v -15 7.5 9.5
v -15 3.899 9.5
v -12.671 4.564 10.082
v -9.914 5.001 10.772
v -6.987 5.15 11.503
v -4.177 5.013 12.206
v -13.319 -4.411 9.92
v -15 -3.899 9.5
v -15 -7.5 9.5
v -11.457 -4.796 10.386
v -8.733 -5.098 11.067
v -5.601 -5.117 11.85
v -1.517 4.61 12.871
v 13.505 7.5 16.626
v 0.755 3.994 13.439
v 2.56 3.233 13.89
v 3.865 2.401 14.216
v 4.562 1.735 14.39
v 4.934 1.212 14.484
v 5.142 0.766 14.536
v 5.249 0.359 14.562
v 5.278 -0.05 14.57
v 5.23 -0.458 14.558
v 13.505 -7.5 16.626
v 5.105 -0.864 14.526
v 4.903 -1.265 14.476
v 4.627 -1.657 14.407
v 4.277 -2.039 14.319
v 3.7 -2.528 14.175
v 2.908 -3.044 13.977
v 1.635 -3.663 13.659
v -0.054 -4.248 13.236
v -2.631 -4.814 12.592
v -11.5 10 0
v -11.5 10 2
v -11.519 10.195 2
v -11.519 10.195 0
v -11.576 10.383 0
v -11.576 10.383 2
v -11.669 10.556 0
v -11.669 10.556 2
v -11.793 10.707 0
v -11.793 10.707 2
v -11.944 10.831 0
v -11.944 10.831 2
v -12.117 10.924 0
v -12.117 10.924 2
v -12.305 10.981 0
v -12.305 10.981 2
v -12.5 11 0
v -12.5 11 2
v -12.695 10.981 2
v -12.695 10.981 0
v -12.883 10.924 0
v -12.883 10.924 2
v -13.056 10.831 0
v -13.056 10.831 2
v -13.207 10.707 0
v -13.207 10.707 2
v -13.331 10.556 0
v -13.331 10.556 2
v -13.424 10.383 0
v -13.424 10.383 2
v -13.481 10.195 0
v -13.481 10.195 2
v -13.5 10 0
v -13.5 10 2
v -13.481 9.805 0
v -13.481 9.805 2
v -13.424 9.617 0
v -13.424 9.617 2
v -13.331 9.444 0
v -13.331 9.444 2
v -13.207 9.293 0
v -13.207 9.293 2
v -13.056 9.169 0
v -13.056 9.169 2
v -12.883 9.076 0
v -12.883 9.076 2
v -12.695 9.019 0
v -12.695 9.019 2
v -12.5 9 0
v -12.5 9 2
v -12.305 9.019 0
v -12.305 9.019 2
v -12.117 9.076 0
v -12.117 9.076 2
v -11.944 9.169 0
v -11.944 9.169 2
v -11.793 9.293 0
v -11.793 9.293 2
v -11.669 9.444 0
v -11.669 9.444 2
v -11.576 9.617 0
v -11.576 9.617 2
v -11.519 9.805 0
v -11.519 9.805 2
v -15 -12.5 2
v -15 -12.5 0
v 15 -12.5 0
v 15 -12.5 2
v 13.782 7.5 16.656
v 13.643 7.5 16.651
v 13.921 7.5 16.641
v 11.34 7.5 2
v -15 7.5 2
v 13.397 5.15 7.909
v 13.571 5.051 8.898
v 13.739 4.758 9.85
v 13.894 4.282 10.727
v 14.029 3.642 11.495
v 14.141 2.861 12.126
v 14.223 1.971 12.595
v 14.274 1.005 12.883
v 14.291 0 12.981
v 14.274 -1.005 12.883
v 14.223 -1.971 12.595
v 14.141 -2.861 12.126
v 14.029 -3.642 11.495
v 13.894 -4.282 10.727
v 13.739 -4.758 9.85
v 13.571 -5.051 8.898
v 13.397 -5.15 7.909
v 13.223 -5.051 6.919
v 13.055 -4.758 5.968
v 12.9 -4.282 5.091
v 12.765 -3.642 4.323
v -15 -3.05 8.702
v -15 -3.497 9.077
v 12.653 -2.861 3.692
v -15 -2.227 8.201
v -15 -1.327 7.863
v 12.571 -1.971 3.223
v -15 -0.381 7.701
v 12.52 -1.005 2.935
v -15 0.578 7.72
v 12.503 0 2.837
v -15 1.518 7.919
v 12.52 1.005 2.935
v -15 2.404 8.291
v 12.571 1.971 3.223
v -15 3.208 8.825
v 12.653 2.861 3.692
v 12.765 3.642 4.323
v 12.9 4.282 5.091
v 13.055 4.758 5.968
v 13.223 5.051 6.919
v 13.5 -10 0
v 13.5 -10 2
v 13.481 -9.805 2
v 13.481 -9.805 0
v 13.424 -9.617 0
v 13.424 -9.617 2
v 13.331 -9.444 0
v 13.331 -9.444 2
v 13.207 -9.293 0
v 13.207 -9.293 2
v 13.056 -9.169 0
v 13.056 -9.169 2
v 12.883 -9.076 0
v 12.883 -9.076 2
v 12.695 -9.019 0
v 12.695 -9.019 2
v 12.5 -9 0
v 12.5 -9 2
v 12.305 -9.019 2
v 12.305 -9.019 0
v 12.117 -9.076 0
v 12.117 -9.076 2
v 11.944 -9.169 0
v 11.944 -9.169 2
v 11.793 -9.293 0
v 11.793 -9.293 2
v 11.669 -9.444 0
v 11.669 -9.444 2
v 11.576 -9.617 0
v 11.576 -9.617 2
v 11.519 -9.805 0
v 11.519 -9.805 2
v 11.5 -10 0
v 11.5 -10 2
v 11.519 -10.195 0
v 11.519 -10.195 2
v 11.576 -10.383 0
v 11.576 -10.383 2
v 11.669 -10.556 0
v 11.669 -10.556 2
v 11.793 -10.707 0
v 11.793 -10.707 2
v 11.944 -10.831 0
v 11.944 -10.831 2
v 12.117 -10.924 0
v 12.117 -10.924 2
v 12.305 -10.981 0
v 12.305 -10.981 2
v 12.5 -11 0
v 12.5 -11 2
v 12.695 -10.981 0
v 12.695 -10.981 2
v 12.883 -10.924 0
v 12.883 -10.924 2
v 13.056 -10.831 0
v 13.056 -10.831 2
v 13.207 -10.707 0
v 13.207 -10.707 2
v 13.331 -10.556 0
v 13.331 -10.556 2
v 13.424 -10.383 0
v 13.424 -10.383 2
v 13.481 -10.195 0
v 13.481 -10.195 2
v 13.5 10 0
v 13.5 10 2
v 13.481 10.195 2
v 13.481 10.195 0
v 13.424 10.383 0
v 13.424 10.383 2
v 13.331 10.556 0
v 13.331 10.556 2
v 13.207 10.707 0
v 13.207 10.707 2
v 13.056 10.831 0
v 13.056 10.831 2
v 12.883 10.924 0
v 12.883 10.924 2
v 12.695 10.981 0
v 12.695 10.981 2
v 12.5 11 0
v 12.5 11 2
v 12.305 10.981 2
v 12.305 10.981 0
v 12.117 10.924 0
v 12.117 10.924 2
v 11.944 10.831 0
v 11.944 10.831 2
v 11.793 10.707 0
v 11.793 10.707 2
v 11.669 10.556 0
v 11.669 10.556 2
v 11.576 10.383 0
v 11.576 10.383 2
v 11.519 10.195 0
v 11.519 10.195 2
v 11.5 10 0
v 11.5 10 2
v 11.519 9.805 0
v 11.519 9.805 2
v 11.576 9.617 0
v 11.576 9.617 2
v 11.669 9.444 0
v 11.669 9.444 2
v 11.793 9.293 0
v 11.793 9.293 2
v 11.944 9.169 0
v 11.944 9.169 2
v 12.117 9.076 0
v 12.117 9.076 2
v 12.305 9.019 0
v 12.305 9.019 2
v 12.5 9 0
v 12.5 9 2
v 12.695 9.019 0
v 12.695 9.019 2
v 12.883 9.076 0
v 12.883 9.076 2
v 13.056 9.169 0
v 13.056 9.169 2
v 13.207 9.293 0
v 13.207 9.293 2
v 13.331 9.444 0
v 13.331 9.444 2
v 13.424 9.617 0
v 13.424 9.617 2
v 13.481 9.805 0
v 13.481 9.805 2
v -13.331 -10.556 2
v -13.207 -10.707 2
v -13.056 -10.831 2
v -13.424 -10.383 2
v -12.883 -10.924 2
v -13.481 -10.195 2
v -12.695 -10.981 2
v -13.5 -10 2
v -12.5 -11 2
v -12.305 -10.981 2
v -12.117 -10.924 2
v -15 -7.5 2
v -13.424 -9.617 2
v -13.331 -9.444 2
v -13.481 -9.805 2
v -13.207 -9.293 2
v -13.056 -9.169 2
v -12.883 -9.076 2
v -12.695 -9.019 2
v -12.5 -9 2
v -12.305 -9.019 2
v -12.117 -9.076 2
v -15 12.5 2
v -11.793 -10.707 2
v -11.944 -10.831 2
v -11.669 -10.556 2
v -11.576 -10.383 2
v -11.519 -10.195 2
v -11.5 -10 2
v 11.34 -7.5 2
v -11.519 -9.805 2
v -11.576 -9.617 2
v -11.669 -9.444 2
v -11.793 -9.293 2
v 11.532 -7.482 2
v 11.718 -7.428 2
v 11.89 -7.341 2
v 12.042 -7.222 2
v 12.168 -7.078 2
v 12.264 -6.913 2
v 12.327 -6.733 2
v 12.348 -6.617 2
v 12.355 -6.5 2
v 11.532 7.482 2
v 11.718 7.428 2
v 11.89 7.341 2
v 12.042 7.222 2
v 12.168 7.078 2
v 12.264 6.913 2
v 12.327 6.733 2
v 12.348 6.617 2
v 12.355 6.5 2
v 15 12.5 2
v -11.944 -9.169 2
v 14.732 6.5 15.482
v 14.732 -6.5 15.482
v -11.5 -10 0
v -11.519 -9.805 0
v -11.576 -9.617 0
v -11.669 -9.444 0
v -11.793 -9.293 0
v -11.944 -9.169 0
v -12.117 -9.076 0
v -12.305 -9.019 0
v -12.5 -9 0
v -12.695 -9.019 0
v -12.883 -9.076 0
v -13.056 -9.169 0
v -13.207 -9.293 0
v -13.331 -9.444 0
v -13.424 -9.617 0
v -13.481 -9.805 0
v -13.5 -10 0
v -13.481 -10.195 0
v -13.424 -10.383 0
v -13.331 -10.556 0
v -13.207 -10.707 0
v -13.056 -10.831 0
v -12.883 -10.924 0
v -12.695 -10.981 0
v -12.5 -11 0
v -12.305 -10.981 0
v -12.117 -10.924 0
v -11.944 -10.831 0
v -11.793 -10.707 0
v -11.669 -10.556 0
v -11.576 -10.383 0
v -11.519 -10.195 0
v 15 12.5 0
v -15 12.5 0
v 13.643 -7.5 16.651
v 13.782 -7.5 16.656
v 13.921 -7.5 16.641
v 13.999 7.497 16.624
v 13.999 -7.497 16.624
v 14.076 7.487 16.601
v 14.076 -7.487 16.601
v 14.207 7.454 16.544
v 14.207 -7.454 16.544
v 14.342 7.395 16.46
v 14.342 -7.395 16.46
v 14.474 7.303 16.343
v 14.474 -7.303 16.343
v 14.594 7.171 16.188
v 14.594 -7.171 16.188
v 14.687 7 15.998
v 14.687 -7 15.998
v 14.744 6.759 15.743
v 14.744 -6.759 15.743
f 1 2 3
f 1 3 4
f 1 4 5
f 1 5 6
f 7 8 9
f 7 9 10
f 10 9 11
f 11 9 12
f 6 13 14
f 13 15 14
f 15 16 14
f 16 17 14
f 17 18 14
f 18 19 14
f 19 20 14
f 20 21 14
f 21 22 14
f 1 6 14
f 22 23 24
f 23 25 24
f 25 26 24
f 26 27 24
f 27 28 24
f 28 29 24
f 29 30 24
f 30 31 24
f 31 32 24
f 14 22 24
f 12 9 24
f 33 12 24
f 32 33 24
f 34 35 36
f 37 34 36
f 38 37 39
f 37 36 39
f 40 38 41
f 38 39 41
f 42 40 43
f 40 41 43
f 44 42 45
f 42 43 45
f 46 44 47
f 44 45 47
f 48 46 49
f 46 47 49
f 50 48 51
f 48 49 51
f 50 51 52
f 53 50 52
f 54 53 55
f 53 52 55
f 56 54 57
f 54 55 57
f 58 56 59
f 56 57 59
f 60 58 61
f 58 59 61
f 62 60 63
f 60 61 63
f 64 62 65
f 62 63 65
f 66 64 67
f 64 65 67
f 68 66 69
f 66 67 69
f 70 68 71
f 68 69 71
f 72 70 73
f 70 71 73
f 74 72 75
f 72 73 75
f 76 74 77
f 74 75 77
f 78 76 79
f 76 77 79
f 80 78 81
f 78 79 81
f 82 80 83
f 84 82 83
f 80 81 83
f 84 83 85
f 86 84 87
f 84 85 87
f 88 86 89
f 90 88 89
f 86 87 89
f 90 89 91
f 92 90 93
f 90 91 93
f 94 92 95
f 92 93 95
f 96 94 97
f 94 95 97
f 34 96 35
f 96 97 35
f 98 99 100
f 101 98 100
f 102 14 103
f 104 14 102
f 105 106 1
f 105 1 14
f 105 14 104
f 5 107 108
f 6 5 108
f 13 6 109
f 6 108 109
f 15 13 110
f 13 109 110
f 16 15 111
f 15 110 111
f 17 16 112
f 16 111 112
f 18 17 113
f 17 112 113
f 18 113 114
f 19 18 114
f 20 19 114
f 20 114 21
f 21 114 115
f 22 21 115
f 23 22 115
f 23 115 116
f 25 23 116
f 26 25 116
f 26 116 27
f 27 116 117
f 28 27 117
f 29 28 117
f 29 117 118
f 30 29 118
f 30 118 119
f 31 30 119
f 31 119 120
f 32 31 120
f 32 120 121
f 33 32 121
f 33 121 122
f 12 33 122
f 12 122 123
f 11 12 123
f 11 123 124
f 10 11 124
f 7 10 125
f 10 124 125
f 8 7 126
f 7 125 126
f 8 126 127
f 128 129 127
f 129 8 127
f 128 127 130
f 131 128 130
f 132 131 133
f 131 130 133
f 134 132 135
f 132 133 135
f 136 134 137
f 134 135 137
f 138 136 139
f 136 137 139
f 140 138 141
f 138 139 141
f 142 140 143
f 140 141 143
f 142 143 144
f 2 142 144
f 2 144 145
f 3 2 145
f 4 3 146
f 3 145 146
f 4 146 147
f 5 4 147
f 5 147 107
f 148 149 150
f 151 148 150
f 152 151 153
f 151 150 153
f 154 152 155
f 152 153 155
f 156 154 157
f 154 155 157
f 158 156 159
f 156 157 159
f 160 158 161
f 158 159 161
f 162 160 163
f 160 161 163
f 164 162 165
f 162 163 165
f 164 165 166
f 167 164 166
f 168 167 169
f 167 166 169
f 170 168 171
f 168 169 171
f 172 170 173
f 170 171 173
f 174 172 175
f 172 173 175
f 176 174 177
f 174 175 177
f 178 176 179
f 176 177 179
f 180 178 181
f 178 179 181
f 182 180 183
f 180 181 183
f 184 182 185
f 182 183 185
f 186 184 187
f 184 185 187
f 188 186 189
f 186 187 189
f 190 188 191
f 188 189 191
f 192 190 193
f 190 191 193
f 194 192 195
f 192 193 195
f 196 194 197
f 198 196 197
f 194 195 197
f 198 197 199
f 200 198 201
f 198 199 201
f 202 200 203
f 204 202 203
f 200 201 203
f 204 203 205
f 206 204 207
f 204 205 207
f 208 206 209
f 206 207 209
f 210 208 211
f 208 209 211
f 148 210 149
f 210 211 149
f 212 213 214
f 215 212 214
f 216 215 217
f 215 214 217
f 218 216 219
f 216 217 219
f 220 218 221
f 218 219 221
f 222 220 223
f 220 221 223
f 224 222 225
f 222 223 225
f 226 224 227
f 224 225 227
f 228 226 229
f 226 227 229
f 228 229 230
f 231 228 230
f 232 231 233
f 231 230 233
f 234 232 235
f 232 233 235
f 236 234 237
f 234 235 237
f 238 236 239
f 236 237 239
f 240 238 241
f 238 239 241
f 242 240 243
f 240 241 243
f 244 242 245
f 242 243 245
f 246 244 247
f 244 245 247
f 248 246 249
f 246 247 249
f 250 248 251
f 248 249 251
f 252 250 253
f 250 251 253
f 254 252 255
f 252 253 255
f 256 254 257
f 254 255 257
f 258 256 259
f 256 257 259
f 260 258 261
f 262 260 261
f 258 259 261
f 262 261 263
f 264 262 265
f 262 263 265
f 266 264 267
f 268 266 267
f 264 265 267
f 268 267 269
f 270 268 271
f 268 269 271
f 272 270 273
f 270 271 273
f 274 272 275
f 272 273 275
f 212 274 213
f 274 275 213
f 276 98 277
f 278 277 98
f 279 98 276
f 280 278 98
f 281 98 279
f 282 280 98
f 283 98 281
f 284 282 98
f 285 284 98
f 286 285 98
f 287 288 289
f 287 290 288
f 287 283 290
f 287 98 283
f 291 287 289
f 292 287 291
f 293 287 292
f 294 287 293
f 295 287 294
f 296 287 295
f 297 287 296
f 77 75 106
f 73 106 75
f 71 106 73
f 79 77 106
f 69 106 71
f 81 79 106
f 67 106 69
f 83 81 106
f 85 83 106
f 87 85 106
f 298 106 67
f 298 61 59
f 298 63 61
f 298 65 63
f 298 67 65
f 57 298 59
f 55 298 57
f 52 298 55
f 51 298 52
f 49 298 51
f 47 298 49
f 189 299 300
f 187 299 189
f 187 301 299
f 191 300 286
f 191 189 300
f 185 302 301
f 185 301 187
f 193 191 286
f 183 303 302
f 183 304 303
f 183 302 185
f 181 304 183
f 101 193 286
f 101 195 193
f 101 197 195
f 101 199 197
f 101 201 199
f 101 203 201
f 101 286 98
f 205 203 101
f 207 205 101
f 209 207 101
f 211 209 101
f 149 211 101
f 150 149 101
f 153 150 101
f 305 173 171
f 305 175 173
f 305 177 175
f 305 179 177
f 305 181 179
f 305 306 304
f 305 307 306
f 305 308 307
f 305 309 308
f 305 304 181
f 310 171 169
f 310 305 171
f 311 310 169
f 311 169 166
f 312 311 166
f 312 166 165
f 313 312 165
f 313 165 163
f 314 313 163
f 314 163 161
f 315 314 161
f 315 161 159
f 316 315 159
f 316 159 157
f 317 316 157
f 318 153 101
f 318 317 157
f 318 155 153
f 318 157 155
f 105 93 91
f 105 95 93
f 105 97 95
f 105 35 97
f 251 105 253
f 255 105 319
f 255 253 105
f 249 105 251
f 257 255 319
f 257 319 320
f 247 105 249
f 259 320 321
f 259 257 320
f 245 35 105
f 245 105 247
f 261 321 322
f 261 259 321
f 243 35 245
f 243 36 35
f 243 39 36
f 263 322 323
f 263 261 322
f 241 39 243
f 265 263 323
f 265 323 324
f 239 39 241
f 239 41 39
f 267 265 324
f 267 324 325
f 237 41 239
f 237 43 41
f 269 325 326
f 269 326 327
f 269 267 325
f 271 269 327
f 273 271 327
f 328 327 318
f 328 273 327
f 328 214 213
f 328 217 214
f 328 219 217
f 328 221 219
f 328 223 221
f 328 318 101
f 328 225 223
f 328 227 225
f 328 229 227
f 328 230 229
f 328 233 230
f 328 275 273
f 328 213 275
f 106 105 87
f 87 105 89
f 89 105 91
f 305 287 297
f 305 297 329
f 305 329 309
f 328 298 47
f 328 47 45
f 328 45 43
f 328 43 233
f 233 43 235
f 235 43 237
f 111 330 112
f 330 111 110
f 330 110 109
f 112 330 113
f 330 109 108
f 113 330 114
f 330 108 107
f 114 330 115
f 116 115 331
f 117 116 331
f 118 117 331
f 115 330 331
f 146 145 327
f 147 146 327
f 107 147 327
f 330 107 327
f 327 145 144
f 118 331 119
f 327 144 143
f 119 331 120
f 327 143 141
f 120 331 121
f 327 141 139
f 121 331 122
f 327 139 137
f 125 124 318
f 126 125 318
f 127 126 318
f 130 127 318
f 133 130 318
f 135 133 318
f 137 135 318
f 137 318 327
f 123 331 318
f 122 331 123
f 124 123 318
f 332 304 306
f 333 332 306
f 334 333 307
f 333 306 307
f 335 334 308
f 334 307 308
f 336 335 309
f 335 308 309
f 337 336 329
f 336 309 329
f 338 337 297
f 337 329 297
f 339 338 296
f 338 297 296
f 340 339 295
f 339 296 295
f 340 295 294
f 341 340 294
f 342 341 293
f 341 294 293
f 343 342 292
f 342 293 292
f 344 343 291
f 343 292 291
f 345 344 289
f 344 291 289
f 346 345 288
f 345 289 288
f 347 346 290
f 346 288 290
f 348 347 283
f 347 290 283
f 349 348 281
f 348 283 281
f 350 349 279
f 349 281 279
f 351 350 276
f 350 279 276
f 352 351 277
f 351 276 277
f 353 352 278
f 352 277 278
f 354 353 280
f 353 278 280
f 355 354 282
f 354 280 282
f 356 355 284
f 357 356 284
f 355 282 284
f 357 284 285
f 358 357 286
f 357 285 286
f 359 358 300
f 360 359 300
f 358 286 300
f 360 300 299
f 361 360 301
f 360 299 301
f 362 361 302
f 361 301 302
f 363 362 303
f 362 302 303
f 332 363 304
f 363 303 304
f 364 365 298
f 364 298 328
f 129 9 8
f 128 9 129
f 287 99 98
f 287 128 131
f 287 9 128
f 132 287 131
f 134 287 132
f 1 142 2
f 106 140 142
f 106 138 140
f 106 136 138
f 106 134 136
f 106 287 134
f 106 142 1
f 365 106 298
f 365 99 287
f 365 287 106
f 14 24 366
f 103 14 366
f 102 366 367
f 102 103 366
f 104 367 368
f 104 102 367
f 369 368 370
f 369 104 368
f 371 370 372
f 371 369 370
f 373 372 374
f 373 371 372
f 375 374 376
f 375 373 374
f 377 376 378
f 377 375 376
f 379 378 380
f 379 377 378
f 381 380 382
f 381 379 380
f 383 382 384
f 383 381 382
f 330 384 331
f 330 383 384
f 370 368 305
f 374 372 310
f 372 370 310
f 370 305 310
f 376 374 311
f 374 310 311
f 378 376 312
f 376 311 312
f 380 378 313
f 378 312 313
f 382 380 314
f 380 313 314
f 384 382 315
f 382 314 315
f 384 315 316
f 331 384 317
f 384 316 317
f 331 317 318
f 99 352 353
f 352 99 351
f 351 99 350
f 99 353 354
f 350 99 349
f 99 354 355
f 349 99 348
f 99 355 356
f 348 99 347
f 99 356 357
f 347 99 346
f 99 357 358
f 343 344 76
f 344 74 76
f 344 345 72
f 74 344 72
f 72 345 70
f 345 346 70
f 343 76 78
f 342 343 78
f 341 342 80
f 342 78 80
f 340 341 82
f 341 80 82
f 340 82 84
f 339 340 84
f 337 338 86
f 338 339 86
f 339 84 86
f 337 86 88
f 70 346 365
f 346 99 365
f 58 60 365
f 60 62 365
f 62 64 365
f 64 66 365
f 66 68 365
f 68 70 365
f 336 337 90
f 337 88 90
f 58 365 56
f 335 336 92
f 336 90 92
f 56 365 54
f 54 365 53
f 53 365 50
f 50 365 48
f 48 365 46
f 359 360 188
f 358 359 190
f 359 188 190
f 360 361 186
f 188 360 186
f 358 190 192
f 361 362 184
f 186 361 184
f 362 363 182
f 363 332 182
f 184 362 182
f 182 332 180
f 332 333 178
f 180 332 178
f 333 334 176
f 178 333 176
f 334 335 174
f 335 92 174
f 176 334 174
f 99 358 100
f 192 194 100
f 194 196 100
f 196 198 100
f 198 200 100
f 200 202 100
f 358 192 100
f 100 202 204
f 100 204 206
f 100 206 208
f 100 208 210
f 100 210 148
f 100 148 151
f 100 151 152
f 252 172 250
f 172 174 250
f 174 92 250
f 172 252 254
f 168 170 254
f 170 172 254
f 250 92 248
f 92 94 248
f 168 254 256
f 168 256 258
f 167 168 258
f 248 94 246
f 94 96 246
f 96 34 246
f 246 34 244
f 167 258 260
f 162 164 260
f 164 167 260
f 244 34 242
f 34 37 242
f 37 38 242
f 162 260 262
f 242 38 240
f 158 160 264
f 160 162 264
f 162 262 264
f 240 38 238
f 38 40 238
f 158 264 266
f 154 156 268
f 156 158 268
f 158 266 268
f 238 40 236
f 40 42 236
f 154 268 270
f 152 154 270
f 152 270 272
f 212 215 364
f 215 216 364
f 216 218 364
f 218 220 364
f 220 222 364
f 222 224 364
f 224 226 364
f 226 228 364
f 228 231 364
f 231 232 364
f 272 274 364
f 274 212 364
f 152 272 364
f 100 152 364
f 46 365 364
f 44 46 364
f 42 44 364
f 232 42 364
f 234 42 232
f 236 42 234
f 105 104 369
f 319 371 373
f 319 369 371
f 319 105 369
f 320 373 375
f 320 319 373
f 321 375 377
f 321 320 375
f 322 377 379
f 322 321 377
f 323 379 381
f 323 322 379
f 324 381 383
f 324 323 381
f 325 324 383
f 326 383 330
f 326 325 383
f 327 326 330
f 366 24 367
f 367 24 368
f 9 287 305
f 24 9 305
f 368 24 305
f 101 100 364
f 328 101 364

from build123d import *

# Parameters (mm, degrees)
F0_W      = 30
F0_H      = 25
F1_DEPTH  = 2
F2_R      = 1
F3_DEPTH  = 2
F4_W      = 30
F4_H      = 15
F5_DEPTH  = 15
F7_DEPTH  = 15
F9_DEPTH  = 15
F10_R     = 5.15
F11_DEPTH = 28.2428712579
F12_R     = 1


with BuildPart() as f1:
    # F0 (on Top) → F1 (new body)
    with BuildSketch(Plane.XY):
        Rectangle(F0_W, F0_H)
    extrude(amount=F1_DEPTH)

    # F2 (on face) → F3 (cut)
    with BuildSketch(Plane.XY.offset(2)):
        with Locations((12.5, 10)):
            Circle(F2_R)
        with Locations((-12.5, 10)):
            Circle(F2_R)
        with Locations((-12.5, -10)):
            Circle(F2_R)
        with Locations((12.5, -10)):
            Circle(F2_R)
    extrude(amount=-F3_DEPTH, mode=Mode.SUBTRACT)

    # F4 (on face) → F5 (join)
    with BuildSketch(Plane.XY.offset(2)):
        Rectangle(F4_W, F4_H)
    extrude(amount=F5_DEPTH)

    # F6 (on face) → F7 (cut, through all)
    with BuildSketch(Plane.XZ.offset(7.5)):
        Polygon((-15, 9.5), (15, 17), (-15, 17), align=None)
    extrude(amount=-F7_DEPTH, mode=Mode.SUBTRACT)

    # F8 (on face) → F9 (cut, through all)
    with BuildSketch(Plane.XZ.offset(7.5)):
        Polygon((15, 2), (15, 17), (12.3550952894, 2), align=None)
    extrude(amount=-F9_DEPTH, mode=Mode.SUBTRACT)

    # F10 (on face) → F11 (cut, through all)
    with BuildSketch(Plane(origin=(11.6405234376, 0, -2.0525383516), x_dir=(0, 1, 0), z_dir=(0.984807753, 0, -0.1736481777))):
        with Locations((0, 10.1150552879)):
            Circle(F10_R)
    extrude(amount=-F11_DEPTH, mode=Mode.SUBTRACT)

    # F12
    f12_edges = [f1.edges().sort_by_distance(p)[0] for p in [
        (13.677548, -7.5, 9.5),
        (13.677548, 7.5, 9.5),
        (15, 0, 17),
    ]]
    fillet(f12_edges, radius=F12_R)


solid = f1.part
